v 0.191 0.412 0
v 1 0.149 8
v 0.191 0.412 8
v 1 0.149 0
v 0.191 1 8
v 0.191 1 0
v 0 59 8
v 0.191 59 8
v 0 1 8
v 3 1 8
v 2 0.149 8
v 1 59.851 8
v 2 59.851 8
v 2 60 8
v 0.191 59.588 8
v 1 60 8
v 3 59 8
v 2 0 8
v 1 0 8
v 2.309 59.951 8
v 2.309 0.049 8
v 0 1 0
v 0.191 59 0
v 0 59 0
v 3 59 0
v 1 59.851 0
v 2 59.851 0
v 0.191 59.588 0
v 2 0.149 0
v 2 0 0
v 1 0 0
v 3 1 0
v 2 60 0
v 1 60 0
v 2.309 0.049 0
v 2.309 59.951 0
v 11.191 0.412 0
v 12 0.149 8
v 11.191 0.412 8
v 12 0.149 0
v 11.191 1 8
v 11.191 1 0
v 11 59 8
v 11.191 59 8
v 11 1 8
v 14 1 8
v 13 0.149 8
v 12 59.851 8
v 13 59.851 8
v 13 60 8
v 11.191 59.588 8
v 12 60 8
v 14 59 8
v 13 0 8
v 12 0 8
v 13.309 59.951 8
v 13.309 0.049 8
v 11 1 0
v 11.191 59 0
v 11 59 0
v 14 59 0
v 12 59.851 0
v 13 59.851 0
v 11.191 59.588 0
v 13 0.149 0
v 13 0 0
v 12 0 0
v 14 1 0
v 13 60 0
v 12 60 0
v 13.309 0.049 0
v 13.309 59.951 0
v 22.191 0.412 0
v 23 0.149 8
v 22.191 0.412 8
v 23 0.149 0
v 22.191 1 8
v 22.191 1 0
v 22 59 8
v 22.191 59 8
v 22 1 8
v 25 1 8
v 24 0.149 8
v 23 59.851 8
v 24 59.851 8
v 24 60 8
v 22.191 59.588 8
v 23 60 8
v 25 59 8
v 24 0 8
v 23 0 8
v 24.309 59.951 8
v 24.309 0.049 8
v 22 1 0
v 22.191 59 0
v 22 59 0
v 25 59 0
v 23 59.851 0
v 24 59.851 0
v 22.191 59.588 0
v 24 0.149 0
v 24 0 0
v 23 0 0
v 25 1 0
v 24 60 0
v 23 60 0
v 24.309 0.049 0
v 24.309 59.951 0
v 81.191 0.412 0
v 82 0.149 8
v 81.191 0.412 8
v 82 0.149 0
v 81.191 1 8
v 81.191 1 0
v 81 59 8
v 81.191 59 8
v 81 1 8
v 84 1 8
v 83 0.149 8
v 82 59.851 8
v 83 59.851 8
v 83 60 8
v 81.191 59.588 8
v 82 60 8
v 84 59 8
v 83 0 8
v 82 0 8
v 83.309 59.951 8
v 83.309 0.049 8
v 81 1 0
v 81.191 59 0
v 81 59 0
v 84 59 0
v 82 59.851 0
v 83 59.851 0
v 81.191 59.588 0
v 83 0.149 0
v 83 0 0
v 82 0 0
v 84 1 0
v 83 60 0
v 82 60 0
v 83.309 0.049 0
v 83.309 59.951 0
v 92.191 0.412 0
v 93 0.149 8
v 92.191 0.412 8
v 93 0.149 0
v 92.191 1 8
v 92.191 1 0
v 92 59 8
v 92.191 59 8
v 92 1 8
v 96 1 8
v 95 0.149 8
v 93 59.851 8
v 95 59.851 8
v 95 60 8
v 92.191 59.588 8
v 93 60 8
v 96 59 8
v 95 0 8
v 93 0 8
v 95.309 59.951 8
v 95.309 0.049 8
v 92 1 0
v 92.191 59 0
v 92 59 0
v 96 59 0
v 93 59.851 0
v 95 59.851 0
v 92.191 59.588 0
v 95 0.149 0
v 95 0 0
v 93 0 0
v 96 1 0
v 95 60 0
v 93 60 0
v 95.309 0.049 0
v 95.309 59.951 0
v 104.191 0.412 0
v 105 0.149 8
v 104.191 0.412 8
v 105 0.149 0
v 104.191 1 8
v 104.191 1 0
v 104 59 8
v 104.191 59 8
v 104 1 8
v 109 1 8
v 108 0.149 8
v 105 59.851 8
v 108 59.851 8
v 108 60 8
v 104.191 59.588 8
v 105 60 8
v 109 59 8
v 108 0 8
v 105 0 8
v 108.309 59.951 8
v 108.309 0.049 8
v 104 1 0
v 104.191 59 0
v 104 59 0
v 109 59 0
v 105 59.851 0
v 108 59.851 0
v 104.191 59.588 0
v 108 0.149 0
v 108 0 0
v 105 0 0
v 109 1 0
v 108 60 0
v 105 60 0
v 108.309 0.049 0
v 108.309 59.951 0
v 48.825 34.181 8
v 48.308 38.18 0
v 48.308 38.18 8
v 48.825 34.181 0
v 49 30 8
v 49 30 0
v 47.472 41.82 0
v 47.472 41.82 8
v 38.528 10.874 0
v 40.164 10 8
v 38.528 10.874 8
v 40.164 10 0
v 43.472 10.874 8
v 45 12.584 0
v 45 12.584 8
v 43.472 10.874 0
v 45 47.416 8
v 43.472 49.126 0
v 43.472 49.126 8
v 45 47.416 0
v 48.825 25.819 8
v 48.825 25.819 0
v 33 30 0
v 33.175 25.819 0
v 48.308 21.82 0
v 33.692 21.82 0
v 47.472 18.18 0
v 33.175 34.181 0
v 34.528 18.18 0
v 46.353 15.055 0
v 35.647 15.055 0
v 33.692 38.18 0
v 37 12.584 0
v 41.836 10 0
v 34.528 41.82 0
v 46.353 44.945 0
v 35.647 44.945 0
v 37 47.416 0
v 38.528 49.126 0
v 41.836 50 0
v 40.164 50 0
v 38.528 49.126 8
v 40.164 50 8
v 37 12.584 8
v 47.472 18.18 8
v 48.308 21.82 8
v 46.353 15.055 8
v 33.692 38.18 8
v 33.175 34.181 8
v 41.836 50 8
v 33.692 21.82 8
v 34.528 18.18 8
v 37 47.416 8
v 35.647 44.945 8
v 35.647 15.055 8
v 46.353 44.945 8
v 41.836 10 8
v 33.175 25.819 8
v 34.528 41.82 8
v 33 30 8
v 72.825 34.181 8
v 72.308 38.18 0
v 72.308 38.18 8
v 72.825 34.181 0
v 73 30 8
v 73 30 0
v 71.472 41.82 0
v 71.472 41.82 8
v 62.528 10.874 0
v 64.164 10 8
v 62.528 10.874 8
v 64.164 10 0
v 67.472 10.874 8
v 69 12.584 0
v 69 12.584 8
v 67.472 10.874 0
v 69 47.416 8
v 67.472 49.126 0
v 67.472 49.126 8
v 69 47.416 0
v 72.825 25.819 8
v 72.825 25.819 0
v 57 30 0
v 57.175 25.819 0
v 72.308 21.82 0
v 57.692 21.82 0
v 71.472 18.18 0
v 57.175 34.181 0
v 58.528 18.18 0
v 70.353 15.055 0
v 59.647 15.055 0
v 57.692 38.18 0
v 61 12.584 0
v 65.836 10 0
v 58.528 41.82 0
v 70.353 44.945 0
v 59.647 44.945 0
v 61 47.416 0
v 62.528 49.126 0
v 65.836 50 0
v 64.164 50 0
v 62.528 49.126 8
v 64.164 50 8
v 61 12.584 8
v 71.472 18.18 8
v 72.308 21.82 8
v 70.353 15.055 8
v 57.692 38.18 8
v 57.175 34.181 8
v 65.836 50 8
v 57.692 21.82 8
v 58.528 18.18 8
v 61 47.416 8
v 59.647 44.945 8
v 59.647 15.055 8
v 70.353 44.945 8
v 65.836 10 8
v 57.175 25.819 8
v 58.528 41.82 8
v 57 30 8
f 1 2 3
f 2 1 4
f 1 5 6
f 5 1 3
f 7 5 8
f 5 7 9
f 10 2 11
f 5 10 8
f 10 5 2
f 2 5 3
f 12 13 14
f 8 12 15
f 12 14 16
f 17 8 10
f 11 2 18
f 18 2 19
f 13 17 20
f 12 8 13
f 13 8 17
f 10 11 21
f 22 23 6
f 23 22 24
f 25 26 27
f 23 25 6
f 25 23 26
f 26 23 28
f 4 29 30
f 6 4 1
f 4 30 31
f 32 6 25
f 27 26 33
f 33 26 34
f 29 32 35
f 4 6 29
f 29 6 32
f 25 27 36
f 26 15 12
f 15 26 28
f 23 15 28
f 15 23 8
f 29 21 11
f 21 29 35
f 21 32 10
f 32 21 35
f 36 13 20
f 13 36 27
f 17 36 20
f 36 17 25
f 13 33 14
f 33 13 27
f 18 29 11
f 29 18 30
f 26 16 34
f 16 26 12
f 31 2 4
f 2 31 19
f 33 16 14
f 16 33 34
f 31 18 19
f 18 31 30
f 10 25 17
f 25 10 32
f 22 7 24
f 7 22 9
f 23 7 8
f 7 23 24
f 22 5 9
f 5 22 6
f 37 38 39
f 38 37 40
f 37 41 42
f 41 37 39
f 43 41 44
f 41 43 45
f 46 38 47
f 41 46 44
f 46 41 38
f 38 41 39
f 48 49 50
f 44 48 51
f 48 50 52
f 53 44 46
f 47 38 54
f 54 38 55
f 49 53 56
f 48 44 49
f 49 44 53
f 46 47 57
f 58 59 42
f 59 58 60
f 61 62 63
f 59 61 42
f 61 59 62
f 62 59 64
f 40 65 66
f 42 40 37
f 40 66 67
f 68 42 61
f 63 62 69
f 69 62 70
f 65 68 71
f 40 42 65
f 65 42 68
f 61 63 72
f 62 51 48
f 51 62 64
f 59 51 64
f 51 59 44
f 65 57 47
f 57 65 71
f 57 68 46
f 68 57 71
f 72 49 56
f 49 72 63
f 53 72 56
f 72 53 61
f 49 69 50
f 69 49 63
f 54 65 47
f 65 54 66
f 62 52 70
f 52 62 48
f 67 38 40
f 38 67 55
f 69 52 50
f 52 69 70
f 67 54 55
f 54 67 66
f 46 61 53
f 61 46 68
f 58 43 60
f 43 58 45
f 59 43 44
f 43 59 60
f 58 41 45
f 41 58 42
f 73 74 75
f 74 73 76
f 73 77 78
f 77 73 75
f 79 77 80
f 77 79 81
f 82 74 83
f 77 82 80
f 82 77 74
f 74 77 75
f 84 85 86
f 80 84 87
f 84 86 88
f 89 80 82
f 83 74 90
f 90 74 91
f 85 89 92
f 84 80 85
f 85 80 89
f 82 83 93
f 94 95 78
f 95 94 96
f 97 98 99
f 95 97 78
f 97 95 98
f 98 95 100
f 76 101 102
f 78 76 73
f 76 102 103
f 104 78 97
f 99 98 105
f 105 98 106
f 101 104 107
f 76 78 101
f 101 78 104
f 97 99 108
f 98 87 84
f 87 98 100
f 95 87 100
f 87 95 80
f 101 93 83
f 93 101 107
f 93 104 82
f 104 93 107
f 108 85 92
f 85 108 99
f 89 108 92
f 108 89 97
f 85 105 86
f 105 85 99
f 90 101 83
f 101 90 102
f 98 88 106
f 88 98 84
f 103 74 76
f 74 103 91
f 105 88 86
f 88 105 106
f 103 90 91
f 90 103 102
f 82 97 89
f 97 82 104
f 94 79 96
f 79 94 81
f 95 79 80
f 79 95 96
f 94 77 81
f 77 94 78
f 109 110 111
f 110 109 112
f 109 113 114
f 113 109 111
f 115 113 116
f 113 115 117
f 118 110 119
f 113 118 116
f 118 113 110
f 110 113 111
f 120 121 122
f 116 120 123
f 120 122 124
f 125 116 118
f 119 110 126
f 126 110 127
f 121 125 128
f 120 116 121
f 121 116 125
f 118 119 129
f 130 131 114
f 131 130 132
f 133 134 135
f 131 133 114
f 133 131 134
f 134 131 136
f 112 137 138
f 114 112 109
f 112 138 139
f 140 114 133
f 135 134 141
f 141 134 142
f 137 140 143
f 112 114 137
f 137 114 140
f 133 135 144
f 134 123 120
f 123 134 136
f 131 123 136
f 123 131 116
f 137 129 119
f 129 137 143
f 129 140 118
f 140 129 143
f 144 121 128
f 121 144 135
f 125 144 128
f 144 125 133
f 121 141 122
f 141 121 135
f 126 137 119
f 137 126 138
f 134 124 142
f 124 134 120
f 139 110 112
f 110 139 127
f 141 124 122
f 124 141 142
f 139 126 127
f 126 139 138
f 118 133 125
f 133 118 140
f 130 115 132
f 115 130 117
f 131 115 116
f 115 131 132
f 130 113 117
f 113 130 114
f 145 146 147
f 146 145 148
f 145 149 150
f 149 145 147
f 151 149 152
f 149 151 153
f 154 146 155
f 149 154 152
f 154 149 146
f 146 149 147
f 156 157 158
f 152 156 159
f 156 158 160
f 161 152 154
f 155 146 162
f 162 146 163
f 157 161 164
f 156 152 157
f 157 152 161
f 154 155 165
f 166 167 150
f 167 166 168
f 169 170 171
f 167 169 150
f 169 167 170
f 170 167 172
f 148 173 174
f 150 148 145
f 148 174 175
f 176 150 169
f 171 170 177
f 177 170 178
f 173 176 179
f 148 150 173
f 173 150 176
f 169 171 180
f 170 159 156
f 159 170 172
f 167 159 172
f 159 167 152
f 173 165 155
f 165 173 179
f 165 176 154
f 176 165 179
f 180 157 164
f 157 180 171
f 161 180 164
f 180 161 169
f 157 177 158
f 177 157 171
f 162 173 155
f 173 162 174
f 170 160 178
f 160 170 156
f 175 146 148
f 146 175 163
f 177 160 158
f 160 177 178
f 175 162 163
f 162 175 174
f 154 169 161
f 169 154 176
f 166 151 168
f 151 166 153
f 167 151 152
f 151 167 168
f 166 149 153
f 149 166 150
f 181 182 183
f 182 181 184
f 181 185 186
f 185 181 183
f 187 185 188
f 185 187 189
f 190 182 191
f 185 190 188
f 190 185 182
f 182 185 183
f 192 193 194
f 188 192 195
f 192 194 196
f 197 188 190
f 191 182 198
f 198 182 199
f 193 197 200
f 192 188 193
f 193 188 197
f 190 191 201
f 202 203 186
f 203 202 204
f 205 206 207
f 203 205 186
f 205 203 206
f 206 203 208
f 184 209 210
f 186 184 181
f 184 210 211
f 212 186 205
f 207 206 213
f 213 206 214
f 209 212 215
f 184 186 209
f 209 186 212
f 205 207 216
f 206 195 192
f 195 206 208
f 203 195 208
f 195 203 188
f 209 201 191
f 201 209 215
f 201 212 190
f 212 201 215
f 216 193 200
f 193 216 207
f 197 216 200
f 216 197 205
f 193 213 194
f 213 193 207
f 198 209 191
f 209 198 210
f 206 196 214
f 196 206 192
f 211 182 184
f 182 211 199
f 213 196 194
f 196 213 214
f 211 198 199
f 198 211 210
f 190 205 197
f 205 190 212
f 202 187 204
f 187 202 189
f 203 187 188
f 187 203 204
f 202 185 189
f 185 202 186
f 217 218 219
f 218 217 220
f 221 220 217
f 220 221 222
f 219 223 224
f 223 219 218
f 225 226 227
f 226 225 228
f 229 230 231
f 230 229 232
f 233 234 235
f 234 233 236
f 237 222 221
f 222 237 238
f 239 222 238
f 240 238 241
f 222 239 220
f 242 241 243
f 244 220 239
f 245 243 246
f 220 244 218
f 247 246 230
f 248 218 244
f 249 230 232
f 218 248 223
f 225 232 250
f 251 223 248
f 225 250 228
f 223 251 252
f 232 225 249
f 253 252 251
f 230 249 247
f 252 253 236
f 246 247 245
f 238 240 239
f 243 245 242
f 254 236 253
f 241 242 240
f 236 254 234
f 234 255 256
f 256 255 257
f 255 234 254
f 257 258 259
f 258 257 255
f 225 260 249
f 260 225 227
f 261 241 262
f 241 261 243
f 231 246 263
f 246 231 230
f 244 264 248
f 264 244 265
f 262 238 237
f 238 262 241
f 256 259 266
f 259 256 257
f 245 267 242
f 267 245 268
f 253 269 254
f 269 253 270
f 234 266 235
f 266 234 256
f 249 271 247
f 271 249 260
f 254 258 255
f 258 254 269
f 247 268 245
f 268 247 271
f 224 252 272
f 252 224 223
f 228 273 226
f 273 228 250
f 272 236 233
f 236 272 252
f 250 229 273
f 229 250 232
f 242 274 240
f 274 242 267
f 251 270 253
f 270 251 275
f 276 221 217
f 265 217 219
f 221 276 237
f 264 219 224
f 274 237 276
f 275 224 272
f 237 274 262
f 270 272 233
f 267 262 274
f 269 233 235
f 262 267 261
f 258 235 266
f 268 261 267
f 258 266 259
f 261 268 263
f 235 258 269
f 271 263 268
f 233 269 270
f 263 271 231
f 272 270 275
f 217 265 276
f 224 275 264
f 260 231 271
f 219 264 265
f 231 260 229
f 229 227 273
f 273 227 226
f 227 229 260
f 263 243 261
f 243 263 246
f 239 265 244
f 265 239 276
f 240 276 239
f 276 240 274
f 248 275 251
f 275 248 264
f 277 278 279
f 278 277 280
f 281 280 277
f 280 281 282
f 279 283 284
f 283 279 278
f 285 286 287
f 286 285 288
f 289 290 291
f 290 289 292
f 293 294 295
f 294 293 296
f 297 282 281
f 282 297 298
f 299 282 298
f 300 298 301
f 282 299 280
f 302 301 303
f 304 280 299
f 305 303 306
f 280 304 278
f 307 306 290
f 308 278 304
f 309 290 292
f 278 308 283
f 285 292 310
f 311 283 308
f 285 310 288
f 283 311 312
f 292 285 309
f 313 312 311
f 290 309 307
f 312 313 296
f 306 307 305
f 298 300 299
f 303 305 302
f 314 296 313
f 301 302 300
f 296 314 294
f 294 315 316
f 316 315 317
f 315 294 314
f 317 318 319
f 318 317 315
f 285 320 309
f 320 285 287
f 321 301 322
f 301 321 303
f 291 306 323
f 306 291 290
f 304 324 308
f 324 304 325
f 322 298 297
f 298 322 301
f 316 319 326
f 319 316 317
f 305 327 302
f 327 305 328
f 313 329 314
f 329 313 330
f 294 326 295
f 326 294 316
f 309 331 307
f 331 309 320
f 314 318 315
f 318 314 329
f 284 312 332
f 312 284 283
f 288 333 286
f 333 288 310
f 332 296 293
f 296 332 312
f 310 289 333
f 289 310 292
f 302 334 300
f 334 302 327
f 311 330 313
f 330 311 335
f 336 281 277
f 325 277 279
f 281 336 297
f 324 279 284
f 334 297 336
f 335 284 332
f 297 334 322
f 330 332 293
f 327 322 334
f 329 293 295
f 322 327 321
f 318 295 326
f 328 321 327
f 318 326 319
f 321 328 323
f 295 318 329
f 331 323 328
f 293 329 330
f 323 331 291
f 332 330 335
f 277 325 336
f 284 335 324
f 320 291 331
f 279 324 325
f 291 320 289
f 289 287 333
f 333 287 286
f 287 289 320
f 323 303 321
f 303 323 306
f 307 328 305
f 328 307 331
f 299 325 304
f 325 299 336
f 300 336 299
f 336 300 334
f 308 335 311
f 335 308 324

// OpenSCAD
// file: ../기타/utils.scad
use <MCAD/boxes.scad>

BIG = [1024, 1024, 1024];

module boardPattern(size = [128, 64, 4], degree = 60, stick = [THICK, THICK, 32]) {
	intersection() {
		cube([size[0], size[1], stick[1]]);
		for (dx = [-1024: stick[2]: 1024]) {
			translate([dx, -cos(degree) * stick[1], -1])	rotate([0, 0, degree])	cube([1024, stick[0], stick[1]]);
			mirror([1, 0, 0])
			translate([dx, -cos(degree) * stick[1], -1])	rotate([0, 0, degree])	cube([1024, stick[0], stick[1]]);
		}
	}
}
module mark(name, height, size = 2) {
	linear_extrude(height, center = false)	text(name, size = size);
}
module hole(w, h, z) {
	translate([w / 2, h / 2, z / 2])		roundedBox(size=[w, h, z], radius = w / 4, sidesonly = true);
}
module ellipsis(w = 32, h = 16, z = 4) {
	translate([w / 2, h / 2, 0])
		resize([w, h, z])
			cylinder(1024, 1024, 1024);
}
module cornerHole(base, m, in, out, height) {
	delta = (out - in) / 2;
		translate([m,					m,					0])	ellipsis(in, in);
		translate([base[0] - m,	m,					0])	ellipsis(in, in);
		translate([base[0] - m,	base[1] - m,		0])	ellipsis(in, in);
		translate([m,					base[1] - m,		0])	ellipsis(in, in);

		translate([m - delta,					m - delta,					height])	ellipsis(out, out);
		translate([base[0] - m  - delta,	m - delta,					height])	ellipsis(out, out);
		translate([base[0] - m  - delta,	base[1] - m - delta,	height])	ellipsis(out, out);
		translate([m - delta,					base[1] - m - delta,	height])	ellipsis(out, out);
}
module lineBox(outter = [100, 100, 100], t = 2) {
	size = outter - [t*2, t*2, t*2];
	center = false;

	translate([t, t, t])	{
		
	// x
	translate([0, 0, 0])						rotate([0, 90, 0])		cylinder(h = size[0], r = t, center = center);
	translate([0, size[1], 0])			rotate([0, 90, 0])		cylinder(h = size[0], r = t, center = center);
	translate([0, size[1], size[2]])	rotate([0, 90, 0])		cylinder(h = size[0], r = t, center = center);
	translate([0, 0, size[2]])			rotate([0, 90, 0])		cylinder(h = size[0], r = t, center = center);

	// y
	translate([0, 0, 0])						rotate([270, 0, 0])		cylinder(h = size[1], r = t, center = center);
	translate([size[0], 0, 0])			rotate([270, 0, 0])		cylinder(h = size[1], r = t, center = center);
	translate([size[0], 0, size[2]])	rotate([270, 0, 0])		cylinder(h = size[1], r = t, center = center);
	translate([0, 0, size[2]])			rotate([270, 0, 0])		cylinder(h = size[1], r = t, center = center);

	// z
	translate([0, 0, 0])						rotate([0, 0, 0])		cylinder(h = size[2], r = t, center = center);
	translate([size[0], 0, 0])			rotate([0, 0, 0])		cylinder(h = size[2], r = t, center = center);
	translate([size[0], size[1], 0])	rotate([0, 0, 0])		cylinder(h = size[2], r = t, center = center);
	translate([0, size[1], 0])	rotate([0, 0, 0])				cylinder(h = size[2], r = t, center = center);
	}
}
module hide(show = 0) {
	if (show > 0) children();
	else scale([0, 0, 0])	children();
}

module t() {
	c = [0.5, 0.5, 0.5, 0.5];
	d = [0.5, 0.5, 0.0, 0.5];
	
	color(c)	difference() {
		cube([4, 16, 2]);
		translate([2, -2, -1])	cube([4, 4, 4]);
	}
	color(d)	translate([8, 0, 0])	cube([16, 4, 2]);
}

module test(b) {
	
	c = [0.5, 0.5, 0.5, 0.5];
	d = [0.5, 0.5, 0.0, 0.5];
	
	color(c)	difference() {
		cube(b);
		translate([-BIG[0]+b[1]/2, b[1]/2, -BIG[2] / 2])	cube(BIG);
		//translate([b[0]-b[1]/2, b[1]/2, -1])	cube([b[1], b[1], b[2]*2]);
	}
}
		//translate([-BIG[0]+16, 16, 0])	cube(BIG);
test([16, 4, 2]);
//cube(BIG);
// file: ../기타/corner-hole.scad
module ellipsis(w, h) {
	translate([w / 2, h / 2, 0])
		resize([w, h, 1024])
			cylinder(1024, 1024, 1024);
}
module cornerHole(base, m, in, out, height) {
	delta = (out - in) / 2;
		translate([m,					m,					0])	ellipsis(in, in);
		translate([base[0] - m,	m,					0])	ellipsis(in, in);
		translate([base[0] - m,	base[1] - m,		0])	ellipsis(in, in);
		translate([m,					base[1] - m,		0])	ellipsis(in, in);

		translate([m - delta,					m - delta,					height])	ellipsis(out, out);
		translate([base[0] - m  - delta,	m - delta,					height])	ellipsis(out, out);
		translate([base[0] - m  - delta,	base[1] - m - delta,	height])	ellipsis(out, out);
		translate([m - delta,					base[1] - m - delta,	height])	ellipsis(out, out);
}
// main file
use <MCAD/boxes.scad>
use <../기타/corner-hole.scad>
use <../기타/utils.scad>

PALETTE = [
	[0.3, 0.1, 0.0, 1.0],	//	갈색, 칼손잡이
	[0.5, 0.5, 0.5, 0.5],	//	회색, 칼날
	[0.9, 0.9, 0.9, 1.0],	//	흰색, 상판
	[0.0, 0.0, 0.9, 0.5],	//	파랑
	[0.0, 0.0, 0.0, 0.0]	//	검정 투명, 호환성 예약
];
ZERO = [0, 0, 0];
HALF = [1/2, 1/2, 1/2];
ONE = [1, 1, 1];
EPSILON = 0.1;

// export
function coreWidth(delta = 8)  = (3 + 3 + 3) + (16 + 16) + (3 + 4 + 5) + delta * 7;
function chefsInfo(delta = 8)  = [(3 + 3 + 3) + (16 + 16) + delta * 5, (3 + 4 + 5) + delta * 2];	//	[x위치, 길이]
function coreSize(delta = 8, thick = 8)  = [coreWidth(delta), 60, thick];

module test(delta = 4) {
	a = [];
	dx = 0;
	for (cx = [0:delta: 256]) {
		dx = dx + delta;
		a = concat(a, [dx]);
		echo(dx, a);
	}
}
//test();

module	roundedBoxNotCenter(size = [32, 64, 8], radius = 8, sidesonly = true) {
	translate([size[0] / 2, size[1] / 2, size[2] / 2])		roundedBox(size, radius, sidesonly);
}

// export
module punch(height = 60, thick = 8, delta = 8) {
	// 과도, 빵칼
	breadStart = 0;
	translate([breadStart, 0, 0])					roundedBoxNotCenter([3, height, thick], 1);
	translate([breadStart + (3 + delta), 0, 0])		roundedBoxNotCenter([3, height, thick], 1);
	translate([breadStart + (3 + delta) * 2, 0, 0])	roundedBoxNotCenter([3, height, thick], 1);
	breadLength = (3 + delta) * 2 + 3;

	// 가위
	scissorStart = breadStart + breadLength + delta;
	scissor = [16, 40];
	translate([scissorStart,						(height - scissor[1]) / 2, 0])	ellipsis(scissor[0], scissor[1], thick);
	translate([scissorStart + scissor[0] + delta,	(height - scissor[1]) / 2, 0])	ellipsis(scissor[0], scissor[1], thick);
	scissorLength = scissor[0] * 2 + delta;
	
	//	식도
	chefsStart = scissorStart + scissorLength + delta;
	translate([chefsStart, 0, 0])						roundedBoxNotCenter([3, height, thick], 1);
	translate([chefsStart + 3 + delta, 0, 0])			roundedBoxNotCenter([4, height, thick], 1);
	translate([chefsStart + (3 + 4) + delta * 2, 0, 0])	roundedBoxNotCenter([5, height, thick], 1);
	chefsLength = (3 + 4 + 5) + delta * 2;
	echo("last x position, ie width", delta, breadStart, breadLength, scissorStart, scissorLength, chefsStart, chefsLength);
}
punch();
module hilt(height = 60, thick = 8, delta = 8) {
	HILT = [41, 40, 16];	//	손잡이
	color(c=PALETTE[0])
		translate([100 + 5 - 6, HILT[1] / 2 - 2, HILT[2] / 2])
			roundedBox(HILT, 4, true);
}
